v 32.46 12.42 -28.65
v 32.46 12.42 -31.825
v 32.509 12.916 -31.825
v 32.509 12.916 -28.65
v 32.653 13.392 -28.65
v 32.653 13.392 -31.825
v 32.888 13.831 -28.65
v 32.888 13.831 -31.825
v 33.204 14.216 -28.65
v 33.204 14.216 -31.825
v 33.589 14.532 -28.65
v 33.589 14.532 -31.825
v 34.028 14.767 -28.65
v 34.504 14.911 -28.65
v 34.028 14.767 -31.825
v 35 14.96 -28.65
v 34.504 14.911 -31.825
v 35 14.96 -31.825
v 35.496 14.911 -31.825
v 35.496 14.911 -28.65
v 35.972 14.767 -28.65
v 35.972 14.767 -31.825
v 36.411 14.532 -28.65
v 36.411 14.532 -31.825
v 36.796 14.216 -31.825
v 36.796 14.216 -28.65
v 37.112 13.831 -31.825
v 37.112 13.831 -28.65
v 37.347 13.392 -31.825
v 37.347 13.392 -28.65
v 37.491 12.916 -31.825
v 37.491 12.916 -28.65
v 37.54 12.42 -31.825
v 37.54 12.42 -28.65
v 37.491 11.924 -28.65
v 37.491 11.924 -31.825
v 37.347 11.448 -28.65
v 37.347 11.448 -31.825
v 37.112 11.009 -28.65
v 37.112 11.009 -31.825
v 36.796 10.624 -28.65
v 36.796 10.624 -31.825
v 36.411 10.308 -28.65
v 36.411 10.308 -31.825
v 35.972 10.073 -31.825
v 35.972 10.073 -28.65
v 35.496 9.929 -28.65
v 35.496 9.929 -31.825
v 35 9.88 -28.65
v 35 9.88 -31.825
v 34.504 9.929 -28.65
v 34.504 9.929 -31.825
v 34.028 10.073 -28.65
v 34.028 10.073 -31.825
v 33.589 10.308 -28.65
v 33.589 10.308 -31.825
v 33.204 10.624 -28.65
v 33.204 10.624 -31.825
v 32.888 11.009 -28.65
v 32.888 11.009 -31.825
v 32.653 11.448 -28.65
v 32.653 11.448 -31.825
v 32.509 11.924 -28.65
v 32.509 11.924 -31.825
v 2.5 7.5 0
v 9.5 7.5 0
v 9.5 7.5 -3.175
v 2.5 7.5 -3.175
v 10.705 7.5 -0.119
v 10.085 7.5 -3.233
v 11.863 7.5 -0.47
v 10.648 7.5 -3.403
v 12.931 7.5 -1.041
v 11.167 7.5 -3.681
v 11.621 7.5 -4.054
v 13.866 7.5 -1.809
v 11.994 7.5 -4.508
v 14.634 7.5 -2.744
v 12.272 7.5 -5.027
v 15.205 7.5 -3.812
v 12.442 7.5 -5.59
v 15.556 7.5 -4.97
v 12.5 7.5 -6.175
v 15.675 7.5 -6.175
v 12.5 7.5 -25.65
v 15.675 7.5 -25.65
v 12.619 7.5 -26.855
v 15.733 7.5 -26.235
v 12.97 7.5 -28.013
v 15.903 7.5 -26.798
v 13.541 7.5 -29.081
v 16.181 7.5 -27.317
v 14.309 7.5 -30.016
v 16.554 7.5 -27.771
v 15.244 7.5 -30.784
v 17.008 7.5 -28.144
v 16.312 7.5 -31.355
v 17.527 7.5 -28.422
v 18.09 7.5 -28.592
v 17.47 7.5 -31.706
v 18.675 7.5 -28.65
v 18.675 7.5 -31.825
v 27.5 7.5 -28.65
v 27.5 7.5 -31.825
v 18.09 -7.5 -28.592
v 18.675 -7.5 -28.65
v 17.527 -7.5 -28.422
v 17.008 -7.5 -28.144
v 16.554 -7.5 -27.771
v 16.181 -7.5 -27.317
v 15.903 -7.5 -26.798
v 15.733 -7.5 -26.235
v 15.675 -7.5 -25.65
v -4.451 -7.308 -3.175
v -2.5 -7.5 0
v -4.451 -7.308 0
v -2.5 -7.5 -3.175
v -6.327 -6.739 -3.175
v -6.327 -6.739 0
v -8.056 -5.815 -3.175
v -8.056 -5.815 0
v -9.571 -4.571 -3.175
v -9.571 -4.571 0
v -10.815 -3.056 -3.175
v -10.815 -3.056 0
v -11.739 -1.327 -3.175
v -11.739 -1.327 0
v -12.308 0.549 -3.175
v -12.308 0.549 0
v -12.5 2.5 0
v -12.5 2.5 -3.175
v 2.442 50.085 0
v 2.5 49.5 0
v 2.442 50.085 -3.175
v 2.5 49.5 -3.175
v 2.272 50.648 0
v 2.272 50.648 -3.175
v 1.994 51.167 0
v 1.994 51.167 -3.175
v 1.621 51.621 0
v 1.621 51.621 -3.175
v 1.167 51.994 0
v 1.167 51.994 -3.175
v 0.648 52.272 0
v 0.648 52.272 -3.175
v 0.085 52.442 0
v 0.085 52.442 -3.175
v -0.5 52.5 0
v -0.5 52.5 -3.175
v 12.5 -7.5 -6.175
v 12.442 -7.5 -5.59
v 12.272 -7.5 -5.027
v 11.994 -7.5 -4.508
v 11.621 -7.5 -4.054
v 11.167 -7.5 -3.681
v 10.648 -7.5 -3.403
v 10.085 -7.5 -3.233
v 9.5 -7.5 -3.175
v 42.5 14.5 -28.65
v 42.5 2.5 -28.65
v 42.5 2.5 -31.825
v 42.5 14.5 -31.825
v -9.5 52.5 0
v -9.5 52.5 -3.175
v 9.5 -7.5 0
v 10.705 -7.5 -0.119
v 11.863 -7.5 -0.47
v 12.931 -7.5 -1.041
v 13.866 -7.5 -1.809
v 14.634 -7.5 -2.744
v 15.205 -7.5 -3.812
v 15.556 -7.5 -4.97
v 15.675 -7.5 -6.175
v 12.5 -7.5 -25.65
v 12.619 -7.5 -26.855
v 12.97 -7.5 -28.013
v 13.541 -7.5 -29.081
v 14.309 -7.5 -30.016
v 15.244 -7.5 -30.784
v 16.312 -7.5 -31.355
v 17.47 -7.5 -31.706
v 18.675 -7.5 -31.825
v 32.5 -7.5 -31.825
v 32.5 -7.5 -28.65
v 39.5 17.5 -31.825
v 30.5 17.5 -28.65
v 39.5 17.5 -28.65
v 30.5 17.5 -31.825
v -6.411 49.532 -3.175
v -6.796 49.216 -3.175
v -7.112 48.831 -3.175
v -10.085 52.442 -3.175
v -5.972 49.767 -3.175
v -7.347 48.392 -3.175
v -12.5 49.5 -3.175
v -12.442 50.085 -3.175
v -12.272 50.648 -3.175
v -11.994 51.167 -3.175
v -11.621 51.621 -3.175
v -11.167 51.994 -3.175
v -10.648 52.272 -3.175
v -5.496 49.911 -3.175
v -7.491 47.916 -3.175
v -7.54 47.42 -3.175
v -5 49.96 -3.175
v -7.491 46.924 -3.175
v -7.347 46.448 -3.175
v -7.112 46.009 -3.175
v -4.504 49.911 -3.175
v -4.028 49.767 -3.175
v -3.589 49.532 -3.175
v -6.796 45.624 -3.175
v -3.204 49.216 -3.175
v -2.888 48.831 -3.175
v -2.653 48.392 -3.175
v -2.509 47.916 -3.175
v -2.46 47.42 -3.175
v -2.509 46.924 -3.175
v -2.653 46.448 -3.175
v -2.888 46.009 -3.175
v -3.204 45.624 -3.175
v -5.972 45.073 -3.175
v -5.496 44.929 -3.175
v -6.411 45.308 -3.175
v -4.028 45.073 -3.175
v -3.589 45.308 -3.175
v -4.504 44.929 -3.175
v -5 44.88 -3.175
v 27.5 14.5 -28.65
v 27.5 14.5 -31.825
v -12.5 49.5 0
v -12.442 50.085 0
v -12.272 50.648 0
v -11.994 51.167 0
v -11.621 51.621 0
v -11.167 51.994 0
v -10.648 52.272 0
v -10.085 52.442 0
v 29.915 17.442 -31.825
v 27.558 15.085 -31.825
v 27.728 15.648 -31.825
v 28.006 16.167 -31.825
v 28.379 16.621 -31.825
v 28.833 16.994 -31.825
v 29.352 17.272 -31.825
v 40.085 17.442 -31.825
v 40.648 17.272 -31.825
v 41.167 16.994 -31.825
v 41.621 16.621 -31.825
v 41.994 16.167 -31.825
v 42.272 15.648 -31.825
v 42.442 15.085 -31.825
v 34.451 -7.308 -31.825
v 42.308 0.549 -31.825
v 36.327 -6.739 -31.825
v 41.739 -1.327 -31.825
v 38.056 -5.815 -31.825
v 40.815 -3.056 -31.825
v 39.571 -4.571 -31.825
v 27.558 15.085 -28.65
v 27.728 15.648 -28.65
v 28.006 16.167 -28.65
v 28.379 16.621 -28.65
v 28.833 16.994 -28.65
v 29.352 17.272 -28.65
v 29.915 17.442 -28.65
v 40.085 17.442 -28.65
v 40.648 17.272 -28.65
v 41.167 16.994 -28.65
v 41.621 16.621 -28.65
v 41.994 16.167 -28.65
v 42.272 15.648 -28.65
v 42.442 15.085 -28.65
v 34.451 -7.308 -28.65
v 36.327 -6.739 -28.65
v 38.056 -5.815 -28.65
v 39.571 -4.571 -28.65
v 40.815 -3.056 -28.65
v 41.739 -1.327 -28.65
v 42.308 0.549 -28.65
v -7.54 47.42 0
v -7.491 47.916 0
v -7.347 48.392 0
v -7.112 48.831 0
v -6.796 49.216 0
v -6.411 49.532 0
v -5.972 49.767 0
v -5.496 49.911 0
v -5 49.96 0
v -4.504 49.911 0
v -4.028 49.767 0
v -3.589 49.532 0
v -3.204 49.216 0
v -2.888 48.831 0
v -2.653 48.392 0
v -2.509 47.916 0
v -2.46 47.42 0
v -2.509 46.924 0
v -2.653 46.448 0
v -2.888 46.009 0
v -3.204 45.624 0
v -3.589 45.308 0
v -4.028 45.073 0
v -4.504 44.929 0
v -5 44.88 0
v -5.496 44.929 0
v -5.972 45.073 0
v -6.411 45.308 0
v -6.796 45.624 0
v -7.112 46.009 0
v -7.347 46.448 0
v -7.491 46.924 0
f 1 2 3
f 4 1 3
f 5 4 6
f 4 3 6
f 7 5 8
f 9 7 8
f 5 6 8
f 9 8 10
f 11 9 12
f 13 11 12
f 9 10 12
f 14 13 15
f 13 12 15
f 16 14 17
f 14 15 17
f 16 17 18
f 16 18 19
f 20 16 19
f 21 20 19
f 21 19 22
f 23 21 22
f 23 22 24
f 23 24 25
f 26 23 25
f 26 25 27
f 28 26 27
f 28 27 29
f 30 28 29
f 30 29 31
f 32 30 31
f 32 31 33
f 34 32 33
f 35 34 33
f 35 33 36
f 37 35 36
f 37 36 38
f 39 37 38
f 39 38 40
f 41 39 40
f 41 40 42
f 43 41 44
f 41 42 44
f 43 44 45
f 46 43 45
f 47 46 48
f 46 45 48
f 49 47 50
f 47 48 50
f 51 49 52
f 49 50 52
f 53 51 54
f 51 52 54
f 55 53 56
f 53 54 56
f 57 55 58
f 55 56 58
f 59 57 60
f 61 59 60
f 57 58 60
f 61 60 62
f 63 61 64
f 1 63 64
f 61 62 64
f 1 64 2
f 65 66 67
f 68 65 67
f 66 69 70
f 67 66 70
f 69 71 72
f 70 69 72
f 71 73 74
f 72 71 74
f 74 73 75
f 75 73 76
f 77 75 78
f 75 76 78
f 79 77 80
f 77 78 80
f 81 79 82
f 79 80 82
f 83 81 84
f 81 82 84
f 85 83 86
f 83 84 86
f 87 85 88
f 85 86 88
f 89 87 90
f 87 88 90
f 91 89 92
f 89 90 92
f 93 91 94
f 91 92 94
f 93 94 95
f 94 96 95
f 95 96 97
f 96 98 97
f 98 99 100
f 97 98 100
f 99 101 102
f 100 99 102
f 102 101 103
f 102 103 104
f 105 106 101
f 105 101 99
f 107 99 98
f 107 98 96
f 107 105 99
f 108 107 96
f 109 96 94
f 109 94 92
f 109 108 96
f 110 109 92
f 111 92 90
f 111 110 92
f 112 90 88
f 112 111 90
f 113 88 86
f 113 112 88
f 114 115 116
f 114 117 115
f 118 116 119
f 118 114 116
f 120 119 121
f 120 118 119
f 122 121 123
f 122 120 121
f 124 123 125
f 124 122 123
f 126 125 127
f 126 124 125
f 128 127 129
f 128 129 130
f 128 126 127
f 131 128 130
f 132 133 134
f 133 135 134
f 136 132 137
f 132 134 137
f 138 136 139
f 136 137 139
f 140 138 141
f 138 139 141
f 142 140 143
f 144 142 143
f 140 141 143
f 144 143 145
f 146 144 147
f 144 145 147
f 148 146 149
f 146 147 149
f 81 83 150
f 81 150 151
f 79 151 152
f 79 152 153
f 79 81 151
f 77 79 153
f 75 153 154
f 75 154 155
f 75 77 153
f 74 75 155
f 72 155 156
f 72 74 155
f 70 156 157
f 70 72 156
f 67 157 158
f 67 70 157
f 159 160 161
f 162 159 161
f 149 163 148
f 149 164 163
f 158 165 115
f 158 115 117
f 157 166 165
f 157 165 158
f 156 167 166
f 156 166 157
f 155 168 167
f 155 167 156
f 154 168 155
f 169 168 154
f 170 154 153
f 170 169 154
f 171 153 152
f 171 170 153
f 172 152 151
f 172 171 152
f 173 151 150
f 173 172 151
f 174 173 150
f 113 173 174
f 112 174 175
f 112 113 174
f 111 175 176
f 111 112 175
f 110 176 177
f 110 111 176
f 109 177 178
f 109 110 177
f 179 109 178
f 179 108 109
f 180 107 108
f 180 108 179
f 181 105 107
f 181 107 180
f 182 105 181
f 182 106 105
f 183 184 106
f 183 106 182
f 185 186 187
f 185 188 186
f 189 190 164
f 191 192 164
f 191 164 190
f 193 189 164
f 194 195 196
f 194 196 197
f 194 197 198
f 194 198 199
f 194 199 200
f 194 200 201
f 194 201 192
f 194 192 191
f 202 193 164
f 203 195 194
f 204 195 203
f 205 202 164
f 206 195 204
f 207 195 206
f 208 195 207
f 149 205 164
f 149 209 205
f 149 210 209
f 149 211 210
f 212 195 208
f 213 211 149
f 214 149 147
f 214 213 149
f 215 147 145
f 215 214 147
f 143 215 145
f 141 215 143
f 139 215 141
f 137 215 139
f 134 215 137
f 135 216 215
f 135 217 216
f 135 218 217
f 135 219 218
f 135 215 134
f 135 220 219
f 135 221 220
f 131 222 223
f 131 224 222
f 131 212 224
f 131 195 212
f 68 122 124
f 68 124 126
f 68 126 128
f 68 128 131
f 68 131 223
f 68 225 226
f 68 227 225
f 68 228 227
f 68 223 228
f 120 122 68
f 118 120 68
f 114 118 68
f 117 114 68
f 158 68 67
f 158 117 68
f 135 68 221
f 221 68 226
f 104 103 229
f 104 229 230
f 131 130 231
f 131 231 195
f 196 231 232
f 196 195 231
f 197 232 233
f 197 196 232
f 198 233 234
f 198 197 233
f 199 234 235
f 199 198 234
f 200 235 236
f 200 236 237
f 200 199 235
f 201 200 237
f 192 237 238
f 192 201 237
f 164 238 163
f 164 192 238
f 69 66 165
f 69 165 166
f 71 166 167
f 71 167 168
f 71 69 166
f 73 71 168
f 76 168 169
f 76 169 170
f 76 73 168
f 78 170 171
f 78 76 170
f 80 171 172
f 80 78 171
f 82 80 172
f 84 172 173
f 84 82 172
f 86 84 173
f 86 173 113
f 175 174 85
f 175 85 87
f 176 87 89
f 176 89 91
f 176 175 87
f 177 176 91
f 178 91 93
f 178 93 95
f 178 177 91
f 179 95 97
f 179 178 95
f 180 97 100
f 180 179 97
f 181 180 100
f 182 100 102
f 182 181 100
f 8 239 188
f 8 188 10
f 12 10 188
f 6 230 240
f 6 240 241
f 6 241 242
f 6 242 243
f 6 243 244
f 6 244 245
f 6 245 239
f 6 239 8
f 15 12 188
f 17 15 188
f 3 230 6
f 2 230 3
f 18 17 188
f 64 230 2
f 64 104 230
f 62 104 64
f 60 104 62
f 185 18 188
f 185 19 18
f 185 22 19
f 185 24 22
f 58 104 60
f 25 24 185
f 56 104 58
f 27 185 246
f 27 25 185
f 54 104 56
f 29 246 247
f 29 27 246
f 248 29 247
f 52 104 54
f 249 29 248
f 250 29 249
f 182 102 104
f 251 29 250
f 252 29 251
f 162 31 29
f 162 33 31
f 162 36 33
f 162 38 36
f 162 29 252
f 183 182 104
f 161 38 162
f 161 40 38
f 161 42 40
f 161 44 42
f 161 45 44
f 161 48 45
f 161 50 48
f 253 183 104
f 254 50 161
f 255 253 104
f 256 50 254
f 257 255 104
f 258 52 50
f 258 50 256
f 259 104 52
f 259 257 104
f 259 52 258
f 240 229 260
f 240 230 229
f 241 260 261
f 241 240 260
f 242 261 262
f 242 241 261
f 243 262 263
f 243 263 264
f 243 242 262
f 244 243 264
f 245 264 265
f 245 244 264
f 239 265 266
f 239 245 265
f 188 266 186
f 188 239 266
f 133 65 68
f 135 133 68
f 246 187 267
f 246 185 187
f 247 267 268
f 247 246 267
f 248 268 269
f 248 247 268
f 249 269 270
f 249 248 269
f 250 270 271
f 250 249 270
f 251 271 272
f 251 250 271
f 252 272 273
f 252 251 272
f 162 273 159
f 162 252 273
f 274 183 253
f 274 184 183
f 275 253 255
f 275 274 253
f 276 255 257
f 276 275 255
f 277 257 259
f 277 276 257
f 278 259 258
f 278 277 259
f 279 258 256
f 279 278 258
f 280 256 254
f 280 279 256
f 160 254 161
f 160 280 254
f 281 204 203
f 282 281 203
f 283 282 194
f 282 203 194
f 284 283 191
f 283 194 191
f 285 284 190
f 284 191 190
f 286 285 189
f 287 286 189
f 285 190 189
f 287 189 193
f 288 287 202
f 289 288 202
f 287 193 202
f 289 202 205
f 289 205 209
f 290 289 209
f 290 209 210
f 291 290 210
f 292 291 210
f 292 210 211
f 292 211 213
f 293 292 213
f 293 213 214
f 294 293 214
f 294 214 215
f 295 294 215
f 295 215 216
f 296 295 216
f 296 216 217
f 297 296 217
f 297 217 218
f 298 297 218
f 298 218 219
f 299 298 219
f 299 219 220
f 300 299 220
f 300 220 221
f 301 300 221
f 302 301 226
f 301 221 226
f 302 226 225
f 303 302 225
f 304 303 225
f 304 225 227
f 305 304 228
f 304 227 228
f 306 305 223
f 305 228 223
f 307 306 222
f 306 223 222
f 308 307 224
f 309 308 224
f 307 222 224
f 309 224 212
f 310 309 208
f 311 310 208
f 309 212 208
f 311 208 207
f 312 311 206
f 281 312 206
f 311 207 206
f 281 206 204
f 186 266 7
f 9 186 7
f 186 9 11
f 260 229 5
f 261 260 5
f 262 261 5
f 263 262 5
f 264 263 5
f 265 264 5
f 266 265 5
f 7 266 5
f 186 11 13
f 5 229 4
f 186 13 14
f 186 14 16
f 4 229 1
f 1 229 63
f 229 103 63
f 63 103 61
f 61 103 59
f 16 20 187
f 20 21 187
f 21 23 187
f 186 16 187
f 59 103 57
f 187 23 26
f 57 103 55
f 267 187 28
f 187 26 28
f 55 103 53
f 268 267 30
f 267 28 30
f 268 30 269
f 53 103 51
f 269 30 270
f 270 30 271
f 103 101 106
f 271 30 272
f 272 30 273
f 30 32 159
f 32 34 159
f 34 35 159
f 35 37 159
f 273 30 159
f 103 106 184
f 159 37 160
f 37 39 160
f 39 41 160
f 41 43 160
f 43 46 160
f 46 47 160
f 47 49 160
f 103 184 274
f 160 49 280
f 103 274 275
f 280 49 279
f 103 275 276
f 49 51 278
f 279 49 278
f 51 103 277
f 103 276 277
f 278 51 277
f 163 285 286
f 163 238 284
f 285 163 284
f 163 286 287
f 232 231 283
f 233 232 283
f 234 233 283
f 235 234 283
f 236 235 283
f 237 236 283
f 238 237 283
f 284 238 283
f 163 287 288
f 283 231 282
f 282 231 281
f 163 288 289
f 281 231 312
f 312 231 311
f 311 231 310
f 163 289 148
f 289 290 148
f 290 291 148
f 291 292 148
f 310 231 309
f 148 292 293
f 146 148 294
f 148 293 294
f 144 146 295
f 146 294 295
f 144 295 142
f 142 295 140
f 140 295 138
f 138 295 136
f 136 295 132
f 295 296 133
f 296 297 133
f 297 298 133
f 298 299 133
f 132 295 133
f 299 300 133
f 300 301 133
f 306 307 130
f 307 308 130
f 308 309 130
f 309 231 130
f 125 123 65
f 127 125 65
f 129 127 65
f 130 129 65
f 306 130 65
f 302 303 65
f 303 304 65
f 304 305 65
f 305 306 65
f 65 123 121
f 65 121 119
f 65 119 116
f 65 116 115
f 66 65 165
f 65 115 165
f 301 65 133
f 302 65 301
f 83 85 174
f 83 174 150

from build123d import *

# Parameters (mm, degrees)
SKETCH1_W                    = 25
SKETCH1_H                    = 15
BASE_FLANGE1_DEPTH           = 3.175
EDGE_FLANGE1_STRIP_W         = 18.7
EDGE_FLANGE1_STRIP_H         = 3.175
EDGE_FLANGE1_STRIP_CUT_DEPTH = 15
EDGE_FLANGE1_DEPTH           = 15
EDGE_FLANGE2_STRIP_W         = 18.7
EDGE_FLANGE2_STRIP_H         = 3.175
EDGE_FLANGE2_STRIP_CUT_DEPTH = 15
EDGE_FLANGE2_DEPTH           = 15
SKETCH12_W                   = 15
SKETCH12_H                   = 3.175
BOSS_EXTRUDE1_DEPTH          = 45
SKETCH15_R                   = 2.54
CUT_EXTRUDE2_DEPTH           = 74.371128518
SKETCH19_W                   = 15
SKETCH19_H                   = 3.175
BOSS_EXTRUDE2_DEPTH          = 10
SKETCH21_R                   = 2.54
CUT_EXTRUDE3_DEPTH           = 75.668136611
FILLET2_R                    = 3
FILLET3_R                    = 10


# Sheet-metal steps are written as plain solids
with BuildPart() as part:
    # Sketch1 → Base-Flange1 (new body)
    with BuildSketch(Plane.XY):
        Rectangle(SKETCH1_W, SKETCH1_H)
    extrude(amount=-BASE_FLANGE1_DEPTH)

    # Edge-Flange1 strip (across the edge) → Edge-Flange1 strip cut (cut)
    with BuildSketch(Plane(origin=(12.5, 7.5, -3.175), x_dir=(-1, 0, 0), z_dir=(0, -1, 0))):
        with Locations((-6.35, -1.5875)):
            Rectangle(EDGE_FLANGE1_STRIP_W, EDGE_FLANGE1_STRIP_H)
    extrude(amount=EDGE_FLANGE1_STRIP_CUT_DEPTH, mode=Mode.SUBTRACT)

    # Edge-Flange1 section (across the edge) → Edge-Flange1 (add)
    with BuildSketch(Plane(origin=(12.5, 7.5, -3.175), x_dir=(-1, 0, 0), z_dir=(0, -1, 0))):
        with BuildLine():
            Line((-3.175, 3), (-3.175, 25.475))
            Line((-3.175, 25.475), (0, 25.475))
            Line((0, 25.475), (0, 3))
            ThreePointArc((0, 3), (0.878679656, 0.878679656), (3, 0))
            Line((3, 0), (3, -3.175))
            ThreePointArc((3, -3.175), (-1.366384374, -1.366384374), (-3.175, 3))
        make_face()
    extrude(amount=EDGE_FLANGE1_DEPTH)

    # Edge-Flange2 strip (across the edge) → Edge-Flange2 strip cut (cut)
    with BuildSketch(Plane(origin=(15.675, -7.5, -28.65), x_dir=(0, 0, 1), z_dir=(0, 1, 0))):
        with Locations((-6.35, -1.5875)):
            Rectangle(EDGE_FLANGE2_STRIP_W, EDGE_FLANGE2_STRIP_H)
    extrude(amount=EDGE_FLANGE2_STRIP_CUT_DEPTH, mode=Mode.SUBTRACT)

    # Edge-Flange2 section (across the edge) → Edge-Flange2 (add)
    with BuildSketch(Plane(origin=(15.675, -7.5, -28.65), x_dir=(0, 0, 1), z_dir=(0, 1, 0))):
        with BuildLine():
            Line((-3.175, 3), (-3.175, 26.825))
            Line((-3.175, 26.825), (0, 26.825))
            Line((0, 26.825), (0, 3))
            ThreePointArc((0, 3), (0.878679656, 0.878679656), (3, 0))
            Line((3, 0), (3, -3.175))
            ThreePointArc((3, -3.175), (-1.366384374, -1.366384374), (-3.175, 3))
        make_face()
    extrude(amount=EDGE_FLANGE2_DEPTH)

    # Sketch12 → Boss-Extrude1 (add)
    with BuildSketch(Plane(origin=(0, 7.5, 0), x_dir=(1, 0, 0), z_dir=(0, 1, 0))):
        with Locations((-5, 1.5875)):
            Rectangle(SKETCH12_W, SKETCH12_H)
    extrude(amount=BOSS_EXTRUDE1_DEPTH)

    # Sketch15 → Cut-Extrude2 (cut, through all)
    with BuildSketch(Plane(origin=(0, 0, -3.175), x_dir=(-1, 0, 0), z_dir=(0, 0, -1))):
        with Locations((5, 47.42)):
            Circle(SKETCH15_R)
    extrude(amount=-CUT_EXTRUDE2_DEPTH, mode=Mode.SUBTRACT)

    # Sketch19 → Boss-Extrude2 (add)
    with BuildSketch(Plane(origin=(0, 7.5, 0), x_dir=(1, 0, 0), z_dir=(0, 1, 0))):
        with Locations((35, 30.2375)):
            Rectangle(SKETCH19_W, SKETCH19_H)
    extrude(amount=BOSS_EXTRUDE2_DEPTH)

    # Sketch21 → Cut-Extrude3 (cut, through all)
    with BuildSketch(Plane(origin=(0, 0, -31.825), x_dir=(-1, 0, 0), z_dir=(0, 0, -1))):
        with Locations((-35, 12.42)):
            Circle(SKETCH21_R)
    extrude(amount=-CUT_EXTRUDE3_DEPTH, mode=Mode.SUBTRACT)

    # Fillet2
    fillet2_edges = [part.edges().sort_by_distance(p)[0] for p in [
        (42.5, 17.5, -30.2375),
        (27.5, 17.5, -30.2375),
        (-12.5, 52.5, -1.5875),
        (2.5, 52.5, -1.5875),
    ]]
    fillet(fillet2_edges, radius=FILLET2_R)

    # Fillet3
    fillet3_edges = [part.edges().sort_by_distance(p)[0] for p in [
        (42.5, -7.5, -30.2375),
        (-12.5, -7.5, -1.5875),
    ]]
    fillet(fillet3_edges, radius=FILLET3_R)


solid = part.part
